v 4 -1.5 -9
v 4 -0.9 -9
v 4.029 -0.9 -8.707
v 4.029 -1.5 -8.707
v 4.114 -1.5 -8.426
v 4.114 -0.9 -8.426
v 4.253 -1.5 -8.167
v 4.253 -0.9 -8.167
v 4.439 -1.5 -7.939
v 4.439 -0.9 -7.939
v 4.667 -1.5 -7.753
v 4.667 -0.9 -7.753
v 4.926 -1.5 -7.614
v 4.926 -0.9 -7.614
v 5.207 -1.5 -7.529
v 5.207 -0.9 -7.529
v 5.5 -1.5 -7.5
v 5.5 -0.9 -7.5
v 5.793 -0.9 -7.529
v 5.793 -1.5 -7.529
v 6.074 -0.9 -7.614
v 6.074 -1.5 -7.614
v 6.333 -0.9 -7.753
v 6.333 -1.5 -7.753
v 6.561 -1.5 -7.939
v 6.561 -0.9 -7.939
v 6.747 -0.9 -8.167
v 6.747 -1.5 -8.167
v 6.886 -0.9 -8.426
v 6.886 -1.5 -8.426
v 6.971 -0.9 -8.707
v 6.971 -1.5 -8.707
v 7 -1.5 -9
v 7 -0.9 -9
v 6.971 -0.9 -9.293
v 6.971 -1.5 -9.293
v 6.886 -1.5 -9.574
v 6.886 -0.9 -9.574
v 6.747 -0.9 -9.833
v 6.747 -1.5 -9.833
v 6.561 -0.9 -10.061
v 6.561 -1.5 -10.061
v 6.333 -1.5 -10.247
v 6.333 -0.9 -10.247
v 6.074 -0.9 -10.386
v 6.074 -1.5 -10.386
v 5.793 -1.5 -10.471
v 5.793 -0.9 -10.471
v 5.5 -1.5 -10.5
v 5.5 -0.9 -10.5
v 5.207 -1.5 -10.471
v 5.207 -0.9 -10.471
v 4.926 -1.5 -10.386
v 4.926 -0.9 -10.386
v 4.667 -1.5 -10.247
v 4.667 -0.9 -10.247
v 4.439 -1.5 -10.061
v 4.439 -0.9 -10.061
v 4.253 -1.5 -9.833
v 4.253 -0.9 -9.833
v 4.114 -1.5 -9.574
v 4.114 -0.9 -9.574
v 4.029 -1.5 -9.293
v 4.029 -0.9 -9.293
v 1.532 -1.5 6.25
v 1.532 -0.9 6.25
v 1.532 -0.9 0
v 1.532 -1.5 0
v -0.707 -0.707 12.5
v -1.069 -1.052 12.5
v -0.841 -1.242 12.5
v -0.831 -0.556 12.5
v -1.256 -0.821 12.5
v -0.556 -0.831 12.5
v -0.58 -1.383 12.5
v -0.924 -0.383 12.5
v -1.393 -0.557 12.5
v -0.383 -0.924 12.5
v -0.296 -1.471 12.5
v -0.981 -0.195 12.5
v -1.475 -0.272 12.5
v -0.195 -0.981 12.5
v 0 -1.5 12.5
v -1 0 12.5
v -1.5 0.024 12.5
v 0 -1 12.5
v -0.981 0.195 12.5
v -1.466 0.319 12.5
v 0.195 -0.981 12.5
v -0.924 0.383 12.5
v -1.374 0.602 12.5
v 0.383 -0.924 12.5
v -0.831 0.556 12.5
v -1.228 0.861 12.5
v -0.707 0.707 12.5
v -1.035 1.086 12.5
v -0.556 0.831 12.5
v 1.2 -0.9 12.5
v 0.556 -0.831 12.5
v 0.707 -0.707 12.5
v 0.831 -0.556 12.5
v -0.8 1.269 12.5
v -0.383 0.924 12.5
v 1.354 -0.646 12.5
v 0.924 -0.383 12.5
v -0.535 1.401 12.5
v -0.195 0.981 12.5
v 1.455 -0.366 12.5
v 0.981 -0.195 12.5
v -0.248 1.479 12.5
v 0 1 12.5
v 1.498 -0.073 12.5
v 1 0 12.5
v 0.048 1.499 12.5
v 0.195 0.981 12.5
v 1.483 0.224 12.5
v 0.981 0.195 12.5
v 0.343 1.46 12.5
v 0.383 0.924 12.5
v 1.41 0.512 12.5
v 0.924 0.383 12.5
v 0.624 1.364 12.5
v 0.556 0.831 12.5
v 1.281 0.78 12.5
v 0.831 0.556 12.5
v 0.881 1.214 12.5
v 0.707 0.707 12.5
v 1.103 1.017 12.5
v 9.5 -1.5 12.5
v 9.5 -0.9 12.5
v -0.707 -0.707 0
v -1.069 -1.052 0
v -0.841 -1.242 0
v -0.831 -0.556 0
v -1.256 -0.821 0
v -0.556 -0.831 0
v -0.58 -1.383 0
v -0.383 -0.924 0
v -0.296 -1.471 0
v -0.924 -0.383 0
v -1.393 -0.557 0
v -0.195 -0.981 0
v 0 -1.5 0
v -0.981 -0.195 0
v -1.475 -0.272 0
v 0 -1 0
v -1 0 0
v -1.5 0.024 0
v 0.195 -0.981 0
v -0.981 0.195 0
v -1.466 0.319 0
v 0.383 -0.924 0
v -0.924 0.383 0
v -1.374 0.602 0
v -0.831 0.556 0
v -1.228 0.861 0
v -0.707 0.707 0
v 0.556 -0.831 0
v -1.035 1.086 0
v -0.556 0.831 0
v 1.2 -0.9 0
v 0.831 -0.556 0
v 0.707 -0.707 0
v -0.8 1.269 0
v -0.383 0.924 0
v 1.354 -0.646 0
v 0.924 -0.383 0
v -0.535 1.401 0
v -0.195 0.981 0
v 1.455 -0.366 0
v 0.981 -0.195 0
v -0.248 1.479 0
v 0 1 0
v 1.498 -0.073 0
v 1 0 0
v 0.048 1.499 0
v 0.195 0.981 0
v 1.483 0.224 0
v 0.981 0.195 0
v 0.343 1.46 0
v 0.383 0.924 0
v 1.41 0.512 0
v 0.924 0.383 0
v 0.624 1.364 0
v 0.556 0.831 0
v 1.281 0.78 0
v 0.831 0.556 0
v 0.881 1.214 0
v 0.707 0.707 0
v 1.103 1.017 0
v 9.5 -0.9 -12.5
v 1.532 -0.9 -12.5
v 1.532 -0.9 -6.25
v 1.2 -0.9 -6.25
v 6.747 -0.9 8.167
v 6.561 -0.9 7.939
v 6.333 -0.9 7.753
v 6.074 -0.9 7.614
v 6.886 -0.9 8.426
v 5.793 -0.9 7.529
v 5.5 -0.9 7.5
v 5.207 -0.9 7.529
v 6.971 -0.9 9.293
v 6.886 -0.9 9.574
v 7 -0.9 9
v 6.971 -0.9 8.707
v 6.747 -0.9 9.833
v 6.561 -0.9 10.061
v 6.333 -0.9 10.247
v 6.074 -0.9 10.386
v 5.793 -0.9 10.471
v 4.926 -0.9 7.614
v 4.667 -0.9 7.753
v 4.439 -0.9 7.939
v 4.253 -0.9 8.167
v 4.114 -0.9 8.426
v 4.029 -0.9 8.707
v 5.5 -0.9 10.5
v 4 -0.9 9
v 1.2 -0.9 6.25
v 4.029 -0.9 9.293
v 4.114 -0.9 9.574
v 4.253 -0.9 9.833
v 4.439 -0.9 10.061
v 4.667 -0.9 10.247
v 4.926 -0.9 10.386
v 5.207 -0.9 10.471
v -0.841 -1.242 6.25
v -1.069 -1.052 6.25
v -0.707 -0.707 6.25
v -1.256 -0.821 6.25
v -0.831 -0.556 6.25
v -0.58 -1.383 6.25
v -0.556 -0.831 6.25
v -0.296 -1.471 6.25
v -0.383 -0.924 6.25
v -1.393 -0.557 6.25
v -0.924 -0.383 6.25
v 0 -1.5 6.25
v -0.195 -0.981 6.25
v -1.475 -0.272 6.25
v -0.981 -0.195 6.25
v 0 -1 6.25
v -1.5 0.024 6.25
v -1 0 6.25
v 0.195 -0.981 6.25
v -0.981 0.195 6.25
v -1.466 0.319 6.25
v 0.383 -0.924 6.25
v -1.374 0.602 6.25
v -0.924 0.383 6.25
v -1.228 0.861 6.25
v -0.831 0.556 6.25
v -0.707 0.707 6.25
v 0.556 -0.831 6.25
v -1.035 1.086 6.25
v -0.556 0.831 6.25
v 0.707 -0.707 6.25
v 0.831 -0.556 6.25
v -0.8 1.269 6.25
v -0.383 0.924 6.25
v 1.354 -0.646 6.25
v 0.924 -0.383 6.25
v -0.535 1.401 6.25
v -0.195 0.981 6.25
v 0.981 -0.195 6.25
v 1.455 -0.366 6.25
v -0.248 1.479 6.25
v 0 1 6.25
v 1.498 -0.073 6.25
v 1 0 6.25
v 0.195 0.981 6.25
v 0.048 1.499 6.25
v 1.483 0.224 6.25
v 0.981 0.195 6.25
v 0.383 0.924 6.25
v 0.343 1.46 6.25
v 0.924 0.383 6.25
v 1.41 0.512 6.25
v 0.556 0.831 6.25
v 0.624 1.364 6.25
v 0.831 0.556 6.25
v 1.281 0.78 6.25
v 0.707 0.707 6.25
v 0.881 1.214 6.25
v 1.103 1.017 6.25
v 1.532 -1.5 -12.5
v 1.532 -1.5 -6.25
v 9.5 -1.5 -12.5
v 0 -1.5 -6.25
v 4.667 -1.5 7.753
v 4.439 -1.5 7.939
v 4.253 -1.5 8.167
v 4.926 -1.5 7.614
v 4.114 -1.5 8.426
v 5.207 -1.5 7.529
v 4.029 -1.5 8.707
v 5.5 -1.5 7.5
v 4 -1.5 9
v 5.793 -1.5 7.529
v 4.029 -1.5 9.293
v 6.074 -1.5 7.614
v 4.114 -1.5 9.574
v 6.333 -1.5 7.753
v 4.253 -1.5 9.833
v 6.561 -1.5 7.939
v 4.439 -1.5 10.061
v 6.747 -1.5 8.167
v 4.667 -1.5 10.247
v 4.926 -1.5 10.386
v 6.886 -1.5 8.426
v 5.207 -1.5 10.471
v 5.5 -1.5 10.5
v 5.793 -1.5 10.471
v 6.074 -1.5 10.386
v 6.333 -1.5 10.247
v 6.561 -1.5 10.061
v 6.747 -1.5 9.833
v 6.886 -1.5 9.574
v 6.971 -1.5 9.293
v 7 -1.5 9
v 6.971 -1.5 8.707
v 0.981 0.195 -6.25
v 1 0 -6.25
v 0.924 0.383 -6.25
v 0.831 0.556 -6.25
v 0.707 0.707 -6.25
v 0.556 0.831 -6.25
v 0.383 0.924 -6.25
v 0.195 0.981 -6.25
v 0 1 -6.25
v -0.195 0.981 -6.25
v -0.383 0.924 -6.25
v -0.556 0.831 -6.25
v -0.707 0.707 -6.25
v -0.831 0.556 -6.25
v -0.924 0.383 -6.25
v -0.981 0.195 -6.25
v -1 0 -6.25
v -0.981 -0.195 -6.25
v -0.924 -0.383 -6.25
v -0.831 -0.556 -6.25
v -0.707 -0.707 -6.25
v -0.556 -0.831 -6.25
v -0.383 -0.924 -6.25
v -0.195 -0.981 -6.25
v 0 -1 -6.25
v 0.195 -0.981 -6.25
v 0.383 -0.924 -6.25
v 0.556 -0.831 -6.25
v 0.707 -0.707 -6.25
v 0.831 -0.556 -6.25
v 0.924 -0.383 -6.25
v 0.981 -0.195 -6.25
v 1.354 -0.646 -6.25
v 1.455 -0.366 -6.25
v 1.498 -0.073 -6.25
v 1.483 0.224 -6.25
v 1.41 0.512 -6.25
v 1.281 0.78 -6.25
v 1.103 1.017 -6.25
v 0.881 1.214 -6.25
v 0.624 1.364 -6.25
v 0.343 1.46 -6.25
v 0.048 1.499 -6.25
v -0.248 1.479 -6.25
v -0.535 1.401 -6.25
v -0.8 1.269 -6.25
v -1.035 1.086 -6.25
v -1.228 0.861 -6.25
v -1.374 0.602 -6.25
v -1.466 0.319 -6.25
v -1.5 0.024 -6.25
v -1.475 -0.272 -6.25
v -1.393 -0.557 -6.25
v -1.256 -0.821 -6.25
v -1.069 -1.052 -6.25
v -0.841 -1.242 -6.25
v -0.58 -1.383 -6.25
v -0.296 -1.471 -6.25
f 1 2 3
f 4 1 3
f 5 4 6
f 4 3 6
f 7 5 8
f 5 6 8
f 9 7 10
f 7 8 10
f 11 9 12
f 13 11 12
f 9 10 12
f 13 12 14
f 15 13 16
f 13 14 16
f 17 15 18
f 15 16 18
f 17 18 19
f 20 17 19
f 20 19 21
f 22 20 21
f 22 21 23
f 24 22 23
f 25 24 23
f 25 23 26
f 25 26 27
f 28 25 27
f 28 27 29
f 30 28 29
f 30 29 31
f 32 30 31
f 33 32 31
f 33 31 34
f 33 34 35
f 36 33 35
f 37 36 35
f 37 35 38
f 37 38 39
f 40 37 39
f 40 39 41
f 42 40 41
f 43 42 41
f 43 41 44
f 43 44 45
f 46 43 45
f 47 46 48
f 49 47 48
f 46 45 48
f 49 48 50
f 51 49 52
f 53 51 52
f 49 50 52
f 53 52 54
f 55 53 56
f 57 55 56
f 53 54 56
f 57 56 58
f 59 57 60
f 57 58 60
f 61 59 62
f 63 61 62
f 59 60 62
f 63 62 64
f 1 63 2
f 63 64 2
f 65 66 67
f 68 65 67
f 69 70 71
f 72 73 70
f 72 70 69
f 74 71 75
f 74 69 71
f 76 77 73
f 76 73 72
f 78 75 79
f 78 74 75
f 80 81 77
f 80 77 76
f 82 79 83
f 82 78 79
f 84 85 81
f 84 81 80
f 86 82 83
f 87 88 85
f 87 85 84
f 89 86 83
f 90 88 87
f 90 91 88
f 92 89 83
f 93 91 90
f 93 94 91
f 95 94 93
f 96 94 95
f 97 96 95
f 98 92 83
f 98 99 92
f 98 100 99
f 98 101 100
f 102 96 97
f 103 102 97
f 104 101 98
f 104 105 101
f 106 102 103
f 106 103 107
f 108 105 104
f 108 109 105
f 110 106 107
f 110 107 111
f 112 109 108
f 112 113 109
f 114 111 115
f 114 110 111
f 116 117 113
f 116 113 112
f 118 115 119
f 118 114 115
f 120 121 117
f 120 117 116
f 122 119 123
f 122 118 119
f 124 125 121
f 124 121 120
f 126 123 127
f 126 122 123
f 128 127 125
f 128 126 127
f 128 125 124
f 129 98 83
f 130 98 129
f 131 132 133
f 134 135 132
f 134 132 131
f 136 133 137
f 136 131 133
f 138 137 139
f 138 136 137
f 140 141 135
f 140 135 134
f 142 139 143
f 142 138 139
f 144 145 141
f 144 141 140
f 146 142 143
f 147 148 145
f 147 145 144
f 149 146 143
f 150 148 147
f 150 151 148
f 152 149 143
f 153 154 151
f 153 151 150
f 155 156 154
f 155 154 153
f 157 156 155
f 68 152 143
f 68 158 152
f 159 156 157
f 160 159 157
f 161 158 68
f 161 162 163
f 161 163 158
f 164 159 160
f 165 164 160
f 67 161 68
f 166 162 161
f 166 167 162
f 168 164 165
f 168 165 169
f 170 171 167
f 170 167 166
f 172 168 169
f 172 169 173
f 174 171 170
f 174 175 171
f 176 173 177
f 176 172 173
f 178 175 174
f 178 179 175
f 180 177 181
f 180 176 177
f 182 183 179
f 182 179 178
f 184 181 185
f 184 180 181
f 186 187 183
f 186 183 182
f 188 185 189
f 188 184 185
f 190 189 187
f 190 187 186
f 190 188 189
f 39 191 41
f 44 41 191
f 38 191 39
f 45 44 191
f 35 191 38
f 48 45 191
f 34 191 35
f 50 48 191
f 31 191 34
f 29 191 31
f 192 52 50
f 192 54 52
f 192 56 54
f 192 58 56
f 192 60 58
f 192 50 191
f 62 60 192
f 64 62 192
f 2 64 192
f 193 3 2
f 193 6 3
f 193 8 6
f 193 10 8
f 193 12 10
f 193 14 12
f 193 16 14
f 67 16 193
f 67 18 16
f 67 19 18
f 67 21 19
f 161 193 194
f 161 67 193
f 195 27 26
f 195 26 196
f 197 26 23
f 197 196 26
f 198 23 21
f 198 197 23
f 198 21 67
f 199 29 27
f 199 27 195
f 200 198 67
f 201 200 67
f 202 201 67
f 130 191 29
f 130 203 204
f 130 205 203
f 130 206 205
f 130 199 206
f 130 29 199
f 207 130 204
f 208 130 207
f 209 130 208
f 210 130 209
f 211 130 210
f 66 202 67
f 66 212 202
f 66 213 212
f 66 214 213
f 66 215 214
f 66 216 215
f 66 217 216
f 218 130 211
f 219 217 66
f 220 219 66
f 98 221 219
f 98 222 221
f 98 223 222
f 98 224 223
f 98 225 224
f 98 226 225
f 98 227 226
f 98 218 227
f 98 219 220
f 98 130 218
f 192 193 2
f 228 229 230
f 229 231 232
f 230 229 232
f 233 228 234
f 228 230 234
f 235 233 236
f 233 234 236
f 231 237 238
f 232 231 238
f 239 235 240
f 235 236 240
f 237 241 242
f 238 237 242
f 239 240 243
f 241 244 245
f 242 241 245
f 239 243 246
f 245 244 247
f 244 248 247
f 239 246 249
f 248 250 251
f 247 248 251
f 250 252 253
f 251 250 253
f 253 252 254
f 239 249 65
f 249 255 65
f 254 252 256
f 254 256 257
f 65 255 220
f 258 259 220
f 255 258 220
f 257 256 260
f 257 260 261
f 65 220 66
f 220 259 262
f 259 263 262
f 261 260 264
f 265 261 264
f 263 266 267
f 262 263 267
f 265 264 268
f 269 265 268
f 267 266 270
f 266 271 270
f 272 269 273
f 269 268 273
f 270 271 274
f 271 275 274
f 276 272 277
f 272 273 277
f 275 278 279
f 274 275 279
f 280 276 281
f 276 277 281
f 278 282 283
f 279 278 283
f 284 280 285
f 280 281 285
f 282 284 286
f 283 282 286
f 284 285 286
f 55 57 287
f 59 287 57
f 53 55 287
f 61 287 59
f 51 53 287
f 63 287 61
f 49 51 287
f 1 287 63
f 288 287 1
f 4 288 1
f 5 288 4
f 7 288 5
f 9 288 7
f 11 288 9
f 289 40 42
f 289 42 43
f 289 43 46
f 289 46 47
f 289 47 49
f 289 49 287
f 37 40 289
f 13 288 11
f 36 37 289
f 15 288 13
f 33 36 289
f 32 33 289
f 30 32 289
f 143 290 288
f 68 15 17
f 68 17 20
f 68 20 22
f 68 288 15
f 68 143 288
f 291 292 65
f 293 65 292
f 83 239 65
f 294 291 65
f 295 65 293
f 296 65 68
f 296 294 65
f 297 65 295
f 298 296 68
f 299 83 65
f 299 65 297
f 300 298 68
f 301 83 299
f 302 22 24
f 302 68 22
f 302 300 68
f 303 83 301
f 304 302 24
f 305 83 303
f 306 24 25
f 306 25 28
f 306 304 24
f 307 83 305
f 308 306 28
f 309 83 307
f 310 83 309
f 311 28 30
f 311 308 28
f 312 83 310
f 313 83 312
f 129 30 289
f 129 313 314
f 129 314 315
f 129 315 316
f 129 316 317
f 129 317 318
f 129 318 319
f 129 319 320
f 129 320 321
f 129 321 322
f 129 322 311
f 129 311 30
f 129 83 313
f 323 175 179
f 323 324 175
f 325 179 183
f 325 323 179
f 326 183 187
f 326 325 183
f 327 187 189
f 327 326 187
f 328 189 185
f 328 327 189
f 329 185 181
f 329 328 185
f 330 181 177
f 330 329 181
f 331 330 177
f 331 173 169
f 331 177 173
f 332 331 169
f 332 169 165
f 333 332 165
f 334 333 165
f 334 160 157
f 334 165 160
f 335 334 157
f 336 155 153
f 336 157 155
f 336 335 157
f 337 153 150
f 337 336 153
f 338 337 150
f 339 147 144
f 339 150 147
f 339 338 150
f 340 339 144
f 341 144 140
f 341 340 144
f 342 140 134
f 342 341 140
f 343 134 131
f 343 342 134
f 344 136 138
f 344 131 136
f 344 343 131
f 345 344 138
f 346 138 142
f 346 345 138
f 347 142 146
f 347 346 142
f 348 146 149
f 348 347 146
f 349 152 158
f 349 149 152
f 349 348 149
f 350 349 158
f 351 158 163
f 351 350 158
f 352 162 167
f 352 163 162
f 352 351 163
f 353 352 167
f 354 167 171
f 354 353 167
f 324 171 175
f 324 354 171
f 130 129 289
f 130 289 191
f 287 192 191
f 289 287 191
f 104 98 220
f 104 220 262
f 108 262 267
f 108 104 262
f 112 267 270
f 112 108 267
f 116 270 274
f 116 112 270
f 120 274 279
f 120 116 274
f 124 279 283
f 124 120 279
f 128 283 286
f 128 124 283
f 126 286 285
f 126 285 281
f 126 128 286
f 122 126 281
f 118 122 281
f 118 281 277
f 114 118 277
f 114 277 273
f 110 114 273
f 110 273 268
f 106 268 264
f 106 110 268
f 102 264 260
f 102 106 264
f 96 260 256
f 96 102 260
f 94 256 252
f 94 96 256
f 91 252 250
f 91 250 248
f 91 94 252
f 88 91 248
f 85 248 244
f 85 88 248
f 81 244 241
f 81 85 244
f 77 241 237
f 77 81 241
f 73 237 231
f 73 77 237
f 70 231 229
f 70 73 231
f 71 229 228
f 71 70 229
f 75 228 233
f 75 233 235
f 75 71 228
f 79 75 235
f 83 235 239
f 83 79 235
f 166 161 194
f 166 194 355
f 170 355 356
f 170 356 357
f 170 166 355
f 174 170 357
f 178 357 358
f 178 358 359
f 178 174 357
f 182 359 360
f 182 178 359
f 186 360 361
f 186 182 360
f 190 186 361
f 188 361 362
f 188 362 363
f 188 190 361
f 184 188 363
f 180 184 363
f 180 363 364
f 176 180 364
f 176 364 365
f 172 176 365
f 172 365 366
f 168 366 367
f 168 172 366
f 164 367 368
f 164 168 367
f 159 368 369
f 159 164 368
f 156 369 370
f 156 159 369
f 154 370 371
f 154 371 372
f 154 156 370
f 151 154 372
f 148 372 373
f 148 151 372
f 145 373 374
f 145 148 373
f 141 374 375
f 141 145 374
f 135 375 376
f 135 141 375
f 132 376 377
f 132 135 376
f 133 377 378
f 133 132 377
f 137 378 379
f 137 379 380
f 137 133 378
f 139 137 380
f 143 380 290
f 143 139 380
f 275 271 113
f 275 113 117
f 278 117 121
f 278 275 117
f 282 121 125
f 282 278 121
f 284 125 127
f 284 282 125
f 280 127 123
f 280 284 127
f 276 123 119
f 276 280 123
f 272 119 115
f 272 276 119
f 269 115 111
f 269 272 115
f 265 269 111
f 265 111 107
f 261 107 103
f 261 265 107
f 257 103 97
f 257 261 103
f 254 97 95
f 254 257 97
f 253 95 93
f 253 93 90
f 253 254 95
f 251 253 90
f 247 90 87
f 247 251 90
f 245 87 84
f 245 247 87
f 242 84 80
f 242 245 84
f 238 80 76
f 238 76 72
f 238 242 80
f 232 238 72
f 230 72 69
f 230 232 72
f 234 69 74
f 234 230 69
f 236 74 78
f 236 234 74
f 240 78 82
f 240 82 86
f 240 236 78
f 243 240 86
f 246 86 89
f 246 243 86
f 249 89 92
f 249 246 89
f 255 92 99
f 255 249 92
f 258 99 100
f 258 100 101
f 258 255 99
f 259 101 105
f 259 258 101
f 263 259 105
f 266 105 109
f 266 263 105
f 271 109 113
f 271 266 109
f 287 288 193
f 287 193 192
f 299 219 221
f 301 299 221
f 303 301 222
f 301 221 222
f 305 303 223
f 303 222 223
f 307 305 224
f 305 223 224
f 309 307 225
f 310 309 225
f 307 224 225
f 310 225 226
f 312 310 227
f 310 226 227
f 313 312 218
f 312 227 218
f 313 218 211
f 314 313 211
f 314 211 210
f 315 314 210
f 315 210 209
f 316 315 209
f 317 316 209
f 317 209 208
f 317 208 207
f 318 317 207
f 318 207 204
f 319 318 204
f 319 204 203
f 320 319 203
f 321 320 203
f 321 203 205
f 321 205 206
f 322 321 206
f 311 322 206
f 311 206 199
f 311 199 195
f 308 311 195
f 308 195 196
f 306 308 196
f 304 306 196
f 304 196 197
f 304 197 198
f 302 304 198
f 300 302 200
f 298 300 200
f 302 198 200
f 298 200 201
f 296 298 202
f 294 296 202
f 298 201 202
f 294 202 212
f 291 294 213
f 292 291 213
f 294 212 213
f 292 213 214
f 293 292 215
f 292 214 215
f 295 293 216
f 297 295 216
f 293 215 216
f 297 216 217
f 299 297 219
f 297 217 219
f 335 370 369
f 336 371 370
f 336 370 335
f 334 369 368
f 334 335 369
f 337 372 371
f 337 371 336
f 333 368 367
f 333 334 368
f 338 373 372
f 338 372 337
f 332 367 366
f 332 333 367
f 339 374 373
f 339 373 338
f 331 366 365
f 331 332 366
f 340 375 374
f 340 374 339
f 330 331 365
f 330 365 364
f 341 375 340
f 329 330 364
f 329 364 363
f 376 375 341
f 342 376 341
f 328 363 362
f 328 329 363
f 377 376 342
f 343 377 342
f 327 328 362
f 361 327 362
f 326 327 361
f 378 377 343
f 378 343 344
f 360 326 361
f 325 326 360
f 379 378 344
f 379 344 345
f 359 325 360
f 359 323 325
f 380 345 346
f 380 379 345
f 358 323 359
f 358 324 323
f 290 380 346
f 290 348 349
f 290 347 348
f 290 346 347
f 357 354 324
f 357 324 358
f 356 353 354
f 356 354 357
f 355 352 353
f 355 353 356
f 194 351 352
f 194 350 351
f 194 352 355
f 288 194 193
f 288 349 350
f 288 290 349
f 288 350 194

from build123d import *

# Parameters (mm, degrees)
SKETCH_2_R          = 1
EXTRUDE_1_DEPTH     = 12.5
SKETCH_3_W          = 3.539964401
SKETCH_3_H          = 6.25
SKETCH_3_W_2        = 3.996790544
CUT_EXTRUDE_1_DEPTH = 12.5
SKETCH_4_R          = 1.5
CUT_EXTRUDE_2_DEPTH = 10


with BuildPart() as part:
    # 草图2 → 凸台-拉伸1 (new, symmetric)
    with BuildSketch(Plane.XY):
        with BuildLine():
            Line((0, -1.5), (9.5, -1.5))
            Line((9.5, -1.5), (9.5, -0.9))
            Line((9.5, -0.9), (1.2, -0.9))
            ThreePointArc((1.2, -0.9), (-0.670820393, 1.341640786), (0, -1.5))
        make_face()
        Circle(SKETCH_2_R, mode=Mode.SUBTRACT)
    extrude(amount=EXTRUDE_1_DEPTH, both=True)

    # 草图3 → 切除-拉伸1 (cut, symmetric)
    with BuildSketch(Plane(origin=(0, -0.9, 0), x_dir=(1, 0, 0), z_dir=(0, 1, 0))):
        with Locations((-0.238476372, 9.375)):
            Rectangle(SKETCH_3_W, SKETCH_3_H)
        with Locations((-0.466889443, -3.125)):
            Rectangle(SKETCH_3_W_2, SKETCH_3_H)
    extrude(amount=CUT_EXTRUDE_1_DEPTH, both=True, mode=Mode.SUBTRACT)

    # 草图4 → 切除-拉伸2 (cut)
    with BuildSketch(Plane(origin=(0, -0.9, 0), x_dir=(1, 0, 0), z_dir=(0, 1, 0))):
        with Locations(Location((5.5, 9, 0), (0, 0, 180))):
            Circle(SKETCH_4_R)
        with Locations(Location((5.5, -9, 0), (0, 0, 180))):
            Circle(SKETCH_4_R)
    extrude(amount=-CUT_EXTRUDE_2_DEPTH, mode=Mode.SUBTRACT)


solid = part.part
